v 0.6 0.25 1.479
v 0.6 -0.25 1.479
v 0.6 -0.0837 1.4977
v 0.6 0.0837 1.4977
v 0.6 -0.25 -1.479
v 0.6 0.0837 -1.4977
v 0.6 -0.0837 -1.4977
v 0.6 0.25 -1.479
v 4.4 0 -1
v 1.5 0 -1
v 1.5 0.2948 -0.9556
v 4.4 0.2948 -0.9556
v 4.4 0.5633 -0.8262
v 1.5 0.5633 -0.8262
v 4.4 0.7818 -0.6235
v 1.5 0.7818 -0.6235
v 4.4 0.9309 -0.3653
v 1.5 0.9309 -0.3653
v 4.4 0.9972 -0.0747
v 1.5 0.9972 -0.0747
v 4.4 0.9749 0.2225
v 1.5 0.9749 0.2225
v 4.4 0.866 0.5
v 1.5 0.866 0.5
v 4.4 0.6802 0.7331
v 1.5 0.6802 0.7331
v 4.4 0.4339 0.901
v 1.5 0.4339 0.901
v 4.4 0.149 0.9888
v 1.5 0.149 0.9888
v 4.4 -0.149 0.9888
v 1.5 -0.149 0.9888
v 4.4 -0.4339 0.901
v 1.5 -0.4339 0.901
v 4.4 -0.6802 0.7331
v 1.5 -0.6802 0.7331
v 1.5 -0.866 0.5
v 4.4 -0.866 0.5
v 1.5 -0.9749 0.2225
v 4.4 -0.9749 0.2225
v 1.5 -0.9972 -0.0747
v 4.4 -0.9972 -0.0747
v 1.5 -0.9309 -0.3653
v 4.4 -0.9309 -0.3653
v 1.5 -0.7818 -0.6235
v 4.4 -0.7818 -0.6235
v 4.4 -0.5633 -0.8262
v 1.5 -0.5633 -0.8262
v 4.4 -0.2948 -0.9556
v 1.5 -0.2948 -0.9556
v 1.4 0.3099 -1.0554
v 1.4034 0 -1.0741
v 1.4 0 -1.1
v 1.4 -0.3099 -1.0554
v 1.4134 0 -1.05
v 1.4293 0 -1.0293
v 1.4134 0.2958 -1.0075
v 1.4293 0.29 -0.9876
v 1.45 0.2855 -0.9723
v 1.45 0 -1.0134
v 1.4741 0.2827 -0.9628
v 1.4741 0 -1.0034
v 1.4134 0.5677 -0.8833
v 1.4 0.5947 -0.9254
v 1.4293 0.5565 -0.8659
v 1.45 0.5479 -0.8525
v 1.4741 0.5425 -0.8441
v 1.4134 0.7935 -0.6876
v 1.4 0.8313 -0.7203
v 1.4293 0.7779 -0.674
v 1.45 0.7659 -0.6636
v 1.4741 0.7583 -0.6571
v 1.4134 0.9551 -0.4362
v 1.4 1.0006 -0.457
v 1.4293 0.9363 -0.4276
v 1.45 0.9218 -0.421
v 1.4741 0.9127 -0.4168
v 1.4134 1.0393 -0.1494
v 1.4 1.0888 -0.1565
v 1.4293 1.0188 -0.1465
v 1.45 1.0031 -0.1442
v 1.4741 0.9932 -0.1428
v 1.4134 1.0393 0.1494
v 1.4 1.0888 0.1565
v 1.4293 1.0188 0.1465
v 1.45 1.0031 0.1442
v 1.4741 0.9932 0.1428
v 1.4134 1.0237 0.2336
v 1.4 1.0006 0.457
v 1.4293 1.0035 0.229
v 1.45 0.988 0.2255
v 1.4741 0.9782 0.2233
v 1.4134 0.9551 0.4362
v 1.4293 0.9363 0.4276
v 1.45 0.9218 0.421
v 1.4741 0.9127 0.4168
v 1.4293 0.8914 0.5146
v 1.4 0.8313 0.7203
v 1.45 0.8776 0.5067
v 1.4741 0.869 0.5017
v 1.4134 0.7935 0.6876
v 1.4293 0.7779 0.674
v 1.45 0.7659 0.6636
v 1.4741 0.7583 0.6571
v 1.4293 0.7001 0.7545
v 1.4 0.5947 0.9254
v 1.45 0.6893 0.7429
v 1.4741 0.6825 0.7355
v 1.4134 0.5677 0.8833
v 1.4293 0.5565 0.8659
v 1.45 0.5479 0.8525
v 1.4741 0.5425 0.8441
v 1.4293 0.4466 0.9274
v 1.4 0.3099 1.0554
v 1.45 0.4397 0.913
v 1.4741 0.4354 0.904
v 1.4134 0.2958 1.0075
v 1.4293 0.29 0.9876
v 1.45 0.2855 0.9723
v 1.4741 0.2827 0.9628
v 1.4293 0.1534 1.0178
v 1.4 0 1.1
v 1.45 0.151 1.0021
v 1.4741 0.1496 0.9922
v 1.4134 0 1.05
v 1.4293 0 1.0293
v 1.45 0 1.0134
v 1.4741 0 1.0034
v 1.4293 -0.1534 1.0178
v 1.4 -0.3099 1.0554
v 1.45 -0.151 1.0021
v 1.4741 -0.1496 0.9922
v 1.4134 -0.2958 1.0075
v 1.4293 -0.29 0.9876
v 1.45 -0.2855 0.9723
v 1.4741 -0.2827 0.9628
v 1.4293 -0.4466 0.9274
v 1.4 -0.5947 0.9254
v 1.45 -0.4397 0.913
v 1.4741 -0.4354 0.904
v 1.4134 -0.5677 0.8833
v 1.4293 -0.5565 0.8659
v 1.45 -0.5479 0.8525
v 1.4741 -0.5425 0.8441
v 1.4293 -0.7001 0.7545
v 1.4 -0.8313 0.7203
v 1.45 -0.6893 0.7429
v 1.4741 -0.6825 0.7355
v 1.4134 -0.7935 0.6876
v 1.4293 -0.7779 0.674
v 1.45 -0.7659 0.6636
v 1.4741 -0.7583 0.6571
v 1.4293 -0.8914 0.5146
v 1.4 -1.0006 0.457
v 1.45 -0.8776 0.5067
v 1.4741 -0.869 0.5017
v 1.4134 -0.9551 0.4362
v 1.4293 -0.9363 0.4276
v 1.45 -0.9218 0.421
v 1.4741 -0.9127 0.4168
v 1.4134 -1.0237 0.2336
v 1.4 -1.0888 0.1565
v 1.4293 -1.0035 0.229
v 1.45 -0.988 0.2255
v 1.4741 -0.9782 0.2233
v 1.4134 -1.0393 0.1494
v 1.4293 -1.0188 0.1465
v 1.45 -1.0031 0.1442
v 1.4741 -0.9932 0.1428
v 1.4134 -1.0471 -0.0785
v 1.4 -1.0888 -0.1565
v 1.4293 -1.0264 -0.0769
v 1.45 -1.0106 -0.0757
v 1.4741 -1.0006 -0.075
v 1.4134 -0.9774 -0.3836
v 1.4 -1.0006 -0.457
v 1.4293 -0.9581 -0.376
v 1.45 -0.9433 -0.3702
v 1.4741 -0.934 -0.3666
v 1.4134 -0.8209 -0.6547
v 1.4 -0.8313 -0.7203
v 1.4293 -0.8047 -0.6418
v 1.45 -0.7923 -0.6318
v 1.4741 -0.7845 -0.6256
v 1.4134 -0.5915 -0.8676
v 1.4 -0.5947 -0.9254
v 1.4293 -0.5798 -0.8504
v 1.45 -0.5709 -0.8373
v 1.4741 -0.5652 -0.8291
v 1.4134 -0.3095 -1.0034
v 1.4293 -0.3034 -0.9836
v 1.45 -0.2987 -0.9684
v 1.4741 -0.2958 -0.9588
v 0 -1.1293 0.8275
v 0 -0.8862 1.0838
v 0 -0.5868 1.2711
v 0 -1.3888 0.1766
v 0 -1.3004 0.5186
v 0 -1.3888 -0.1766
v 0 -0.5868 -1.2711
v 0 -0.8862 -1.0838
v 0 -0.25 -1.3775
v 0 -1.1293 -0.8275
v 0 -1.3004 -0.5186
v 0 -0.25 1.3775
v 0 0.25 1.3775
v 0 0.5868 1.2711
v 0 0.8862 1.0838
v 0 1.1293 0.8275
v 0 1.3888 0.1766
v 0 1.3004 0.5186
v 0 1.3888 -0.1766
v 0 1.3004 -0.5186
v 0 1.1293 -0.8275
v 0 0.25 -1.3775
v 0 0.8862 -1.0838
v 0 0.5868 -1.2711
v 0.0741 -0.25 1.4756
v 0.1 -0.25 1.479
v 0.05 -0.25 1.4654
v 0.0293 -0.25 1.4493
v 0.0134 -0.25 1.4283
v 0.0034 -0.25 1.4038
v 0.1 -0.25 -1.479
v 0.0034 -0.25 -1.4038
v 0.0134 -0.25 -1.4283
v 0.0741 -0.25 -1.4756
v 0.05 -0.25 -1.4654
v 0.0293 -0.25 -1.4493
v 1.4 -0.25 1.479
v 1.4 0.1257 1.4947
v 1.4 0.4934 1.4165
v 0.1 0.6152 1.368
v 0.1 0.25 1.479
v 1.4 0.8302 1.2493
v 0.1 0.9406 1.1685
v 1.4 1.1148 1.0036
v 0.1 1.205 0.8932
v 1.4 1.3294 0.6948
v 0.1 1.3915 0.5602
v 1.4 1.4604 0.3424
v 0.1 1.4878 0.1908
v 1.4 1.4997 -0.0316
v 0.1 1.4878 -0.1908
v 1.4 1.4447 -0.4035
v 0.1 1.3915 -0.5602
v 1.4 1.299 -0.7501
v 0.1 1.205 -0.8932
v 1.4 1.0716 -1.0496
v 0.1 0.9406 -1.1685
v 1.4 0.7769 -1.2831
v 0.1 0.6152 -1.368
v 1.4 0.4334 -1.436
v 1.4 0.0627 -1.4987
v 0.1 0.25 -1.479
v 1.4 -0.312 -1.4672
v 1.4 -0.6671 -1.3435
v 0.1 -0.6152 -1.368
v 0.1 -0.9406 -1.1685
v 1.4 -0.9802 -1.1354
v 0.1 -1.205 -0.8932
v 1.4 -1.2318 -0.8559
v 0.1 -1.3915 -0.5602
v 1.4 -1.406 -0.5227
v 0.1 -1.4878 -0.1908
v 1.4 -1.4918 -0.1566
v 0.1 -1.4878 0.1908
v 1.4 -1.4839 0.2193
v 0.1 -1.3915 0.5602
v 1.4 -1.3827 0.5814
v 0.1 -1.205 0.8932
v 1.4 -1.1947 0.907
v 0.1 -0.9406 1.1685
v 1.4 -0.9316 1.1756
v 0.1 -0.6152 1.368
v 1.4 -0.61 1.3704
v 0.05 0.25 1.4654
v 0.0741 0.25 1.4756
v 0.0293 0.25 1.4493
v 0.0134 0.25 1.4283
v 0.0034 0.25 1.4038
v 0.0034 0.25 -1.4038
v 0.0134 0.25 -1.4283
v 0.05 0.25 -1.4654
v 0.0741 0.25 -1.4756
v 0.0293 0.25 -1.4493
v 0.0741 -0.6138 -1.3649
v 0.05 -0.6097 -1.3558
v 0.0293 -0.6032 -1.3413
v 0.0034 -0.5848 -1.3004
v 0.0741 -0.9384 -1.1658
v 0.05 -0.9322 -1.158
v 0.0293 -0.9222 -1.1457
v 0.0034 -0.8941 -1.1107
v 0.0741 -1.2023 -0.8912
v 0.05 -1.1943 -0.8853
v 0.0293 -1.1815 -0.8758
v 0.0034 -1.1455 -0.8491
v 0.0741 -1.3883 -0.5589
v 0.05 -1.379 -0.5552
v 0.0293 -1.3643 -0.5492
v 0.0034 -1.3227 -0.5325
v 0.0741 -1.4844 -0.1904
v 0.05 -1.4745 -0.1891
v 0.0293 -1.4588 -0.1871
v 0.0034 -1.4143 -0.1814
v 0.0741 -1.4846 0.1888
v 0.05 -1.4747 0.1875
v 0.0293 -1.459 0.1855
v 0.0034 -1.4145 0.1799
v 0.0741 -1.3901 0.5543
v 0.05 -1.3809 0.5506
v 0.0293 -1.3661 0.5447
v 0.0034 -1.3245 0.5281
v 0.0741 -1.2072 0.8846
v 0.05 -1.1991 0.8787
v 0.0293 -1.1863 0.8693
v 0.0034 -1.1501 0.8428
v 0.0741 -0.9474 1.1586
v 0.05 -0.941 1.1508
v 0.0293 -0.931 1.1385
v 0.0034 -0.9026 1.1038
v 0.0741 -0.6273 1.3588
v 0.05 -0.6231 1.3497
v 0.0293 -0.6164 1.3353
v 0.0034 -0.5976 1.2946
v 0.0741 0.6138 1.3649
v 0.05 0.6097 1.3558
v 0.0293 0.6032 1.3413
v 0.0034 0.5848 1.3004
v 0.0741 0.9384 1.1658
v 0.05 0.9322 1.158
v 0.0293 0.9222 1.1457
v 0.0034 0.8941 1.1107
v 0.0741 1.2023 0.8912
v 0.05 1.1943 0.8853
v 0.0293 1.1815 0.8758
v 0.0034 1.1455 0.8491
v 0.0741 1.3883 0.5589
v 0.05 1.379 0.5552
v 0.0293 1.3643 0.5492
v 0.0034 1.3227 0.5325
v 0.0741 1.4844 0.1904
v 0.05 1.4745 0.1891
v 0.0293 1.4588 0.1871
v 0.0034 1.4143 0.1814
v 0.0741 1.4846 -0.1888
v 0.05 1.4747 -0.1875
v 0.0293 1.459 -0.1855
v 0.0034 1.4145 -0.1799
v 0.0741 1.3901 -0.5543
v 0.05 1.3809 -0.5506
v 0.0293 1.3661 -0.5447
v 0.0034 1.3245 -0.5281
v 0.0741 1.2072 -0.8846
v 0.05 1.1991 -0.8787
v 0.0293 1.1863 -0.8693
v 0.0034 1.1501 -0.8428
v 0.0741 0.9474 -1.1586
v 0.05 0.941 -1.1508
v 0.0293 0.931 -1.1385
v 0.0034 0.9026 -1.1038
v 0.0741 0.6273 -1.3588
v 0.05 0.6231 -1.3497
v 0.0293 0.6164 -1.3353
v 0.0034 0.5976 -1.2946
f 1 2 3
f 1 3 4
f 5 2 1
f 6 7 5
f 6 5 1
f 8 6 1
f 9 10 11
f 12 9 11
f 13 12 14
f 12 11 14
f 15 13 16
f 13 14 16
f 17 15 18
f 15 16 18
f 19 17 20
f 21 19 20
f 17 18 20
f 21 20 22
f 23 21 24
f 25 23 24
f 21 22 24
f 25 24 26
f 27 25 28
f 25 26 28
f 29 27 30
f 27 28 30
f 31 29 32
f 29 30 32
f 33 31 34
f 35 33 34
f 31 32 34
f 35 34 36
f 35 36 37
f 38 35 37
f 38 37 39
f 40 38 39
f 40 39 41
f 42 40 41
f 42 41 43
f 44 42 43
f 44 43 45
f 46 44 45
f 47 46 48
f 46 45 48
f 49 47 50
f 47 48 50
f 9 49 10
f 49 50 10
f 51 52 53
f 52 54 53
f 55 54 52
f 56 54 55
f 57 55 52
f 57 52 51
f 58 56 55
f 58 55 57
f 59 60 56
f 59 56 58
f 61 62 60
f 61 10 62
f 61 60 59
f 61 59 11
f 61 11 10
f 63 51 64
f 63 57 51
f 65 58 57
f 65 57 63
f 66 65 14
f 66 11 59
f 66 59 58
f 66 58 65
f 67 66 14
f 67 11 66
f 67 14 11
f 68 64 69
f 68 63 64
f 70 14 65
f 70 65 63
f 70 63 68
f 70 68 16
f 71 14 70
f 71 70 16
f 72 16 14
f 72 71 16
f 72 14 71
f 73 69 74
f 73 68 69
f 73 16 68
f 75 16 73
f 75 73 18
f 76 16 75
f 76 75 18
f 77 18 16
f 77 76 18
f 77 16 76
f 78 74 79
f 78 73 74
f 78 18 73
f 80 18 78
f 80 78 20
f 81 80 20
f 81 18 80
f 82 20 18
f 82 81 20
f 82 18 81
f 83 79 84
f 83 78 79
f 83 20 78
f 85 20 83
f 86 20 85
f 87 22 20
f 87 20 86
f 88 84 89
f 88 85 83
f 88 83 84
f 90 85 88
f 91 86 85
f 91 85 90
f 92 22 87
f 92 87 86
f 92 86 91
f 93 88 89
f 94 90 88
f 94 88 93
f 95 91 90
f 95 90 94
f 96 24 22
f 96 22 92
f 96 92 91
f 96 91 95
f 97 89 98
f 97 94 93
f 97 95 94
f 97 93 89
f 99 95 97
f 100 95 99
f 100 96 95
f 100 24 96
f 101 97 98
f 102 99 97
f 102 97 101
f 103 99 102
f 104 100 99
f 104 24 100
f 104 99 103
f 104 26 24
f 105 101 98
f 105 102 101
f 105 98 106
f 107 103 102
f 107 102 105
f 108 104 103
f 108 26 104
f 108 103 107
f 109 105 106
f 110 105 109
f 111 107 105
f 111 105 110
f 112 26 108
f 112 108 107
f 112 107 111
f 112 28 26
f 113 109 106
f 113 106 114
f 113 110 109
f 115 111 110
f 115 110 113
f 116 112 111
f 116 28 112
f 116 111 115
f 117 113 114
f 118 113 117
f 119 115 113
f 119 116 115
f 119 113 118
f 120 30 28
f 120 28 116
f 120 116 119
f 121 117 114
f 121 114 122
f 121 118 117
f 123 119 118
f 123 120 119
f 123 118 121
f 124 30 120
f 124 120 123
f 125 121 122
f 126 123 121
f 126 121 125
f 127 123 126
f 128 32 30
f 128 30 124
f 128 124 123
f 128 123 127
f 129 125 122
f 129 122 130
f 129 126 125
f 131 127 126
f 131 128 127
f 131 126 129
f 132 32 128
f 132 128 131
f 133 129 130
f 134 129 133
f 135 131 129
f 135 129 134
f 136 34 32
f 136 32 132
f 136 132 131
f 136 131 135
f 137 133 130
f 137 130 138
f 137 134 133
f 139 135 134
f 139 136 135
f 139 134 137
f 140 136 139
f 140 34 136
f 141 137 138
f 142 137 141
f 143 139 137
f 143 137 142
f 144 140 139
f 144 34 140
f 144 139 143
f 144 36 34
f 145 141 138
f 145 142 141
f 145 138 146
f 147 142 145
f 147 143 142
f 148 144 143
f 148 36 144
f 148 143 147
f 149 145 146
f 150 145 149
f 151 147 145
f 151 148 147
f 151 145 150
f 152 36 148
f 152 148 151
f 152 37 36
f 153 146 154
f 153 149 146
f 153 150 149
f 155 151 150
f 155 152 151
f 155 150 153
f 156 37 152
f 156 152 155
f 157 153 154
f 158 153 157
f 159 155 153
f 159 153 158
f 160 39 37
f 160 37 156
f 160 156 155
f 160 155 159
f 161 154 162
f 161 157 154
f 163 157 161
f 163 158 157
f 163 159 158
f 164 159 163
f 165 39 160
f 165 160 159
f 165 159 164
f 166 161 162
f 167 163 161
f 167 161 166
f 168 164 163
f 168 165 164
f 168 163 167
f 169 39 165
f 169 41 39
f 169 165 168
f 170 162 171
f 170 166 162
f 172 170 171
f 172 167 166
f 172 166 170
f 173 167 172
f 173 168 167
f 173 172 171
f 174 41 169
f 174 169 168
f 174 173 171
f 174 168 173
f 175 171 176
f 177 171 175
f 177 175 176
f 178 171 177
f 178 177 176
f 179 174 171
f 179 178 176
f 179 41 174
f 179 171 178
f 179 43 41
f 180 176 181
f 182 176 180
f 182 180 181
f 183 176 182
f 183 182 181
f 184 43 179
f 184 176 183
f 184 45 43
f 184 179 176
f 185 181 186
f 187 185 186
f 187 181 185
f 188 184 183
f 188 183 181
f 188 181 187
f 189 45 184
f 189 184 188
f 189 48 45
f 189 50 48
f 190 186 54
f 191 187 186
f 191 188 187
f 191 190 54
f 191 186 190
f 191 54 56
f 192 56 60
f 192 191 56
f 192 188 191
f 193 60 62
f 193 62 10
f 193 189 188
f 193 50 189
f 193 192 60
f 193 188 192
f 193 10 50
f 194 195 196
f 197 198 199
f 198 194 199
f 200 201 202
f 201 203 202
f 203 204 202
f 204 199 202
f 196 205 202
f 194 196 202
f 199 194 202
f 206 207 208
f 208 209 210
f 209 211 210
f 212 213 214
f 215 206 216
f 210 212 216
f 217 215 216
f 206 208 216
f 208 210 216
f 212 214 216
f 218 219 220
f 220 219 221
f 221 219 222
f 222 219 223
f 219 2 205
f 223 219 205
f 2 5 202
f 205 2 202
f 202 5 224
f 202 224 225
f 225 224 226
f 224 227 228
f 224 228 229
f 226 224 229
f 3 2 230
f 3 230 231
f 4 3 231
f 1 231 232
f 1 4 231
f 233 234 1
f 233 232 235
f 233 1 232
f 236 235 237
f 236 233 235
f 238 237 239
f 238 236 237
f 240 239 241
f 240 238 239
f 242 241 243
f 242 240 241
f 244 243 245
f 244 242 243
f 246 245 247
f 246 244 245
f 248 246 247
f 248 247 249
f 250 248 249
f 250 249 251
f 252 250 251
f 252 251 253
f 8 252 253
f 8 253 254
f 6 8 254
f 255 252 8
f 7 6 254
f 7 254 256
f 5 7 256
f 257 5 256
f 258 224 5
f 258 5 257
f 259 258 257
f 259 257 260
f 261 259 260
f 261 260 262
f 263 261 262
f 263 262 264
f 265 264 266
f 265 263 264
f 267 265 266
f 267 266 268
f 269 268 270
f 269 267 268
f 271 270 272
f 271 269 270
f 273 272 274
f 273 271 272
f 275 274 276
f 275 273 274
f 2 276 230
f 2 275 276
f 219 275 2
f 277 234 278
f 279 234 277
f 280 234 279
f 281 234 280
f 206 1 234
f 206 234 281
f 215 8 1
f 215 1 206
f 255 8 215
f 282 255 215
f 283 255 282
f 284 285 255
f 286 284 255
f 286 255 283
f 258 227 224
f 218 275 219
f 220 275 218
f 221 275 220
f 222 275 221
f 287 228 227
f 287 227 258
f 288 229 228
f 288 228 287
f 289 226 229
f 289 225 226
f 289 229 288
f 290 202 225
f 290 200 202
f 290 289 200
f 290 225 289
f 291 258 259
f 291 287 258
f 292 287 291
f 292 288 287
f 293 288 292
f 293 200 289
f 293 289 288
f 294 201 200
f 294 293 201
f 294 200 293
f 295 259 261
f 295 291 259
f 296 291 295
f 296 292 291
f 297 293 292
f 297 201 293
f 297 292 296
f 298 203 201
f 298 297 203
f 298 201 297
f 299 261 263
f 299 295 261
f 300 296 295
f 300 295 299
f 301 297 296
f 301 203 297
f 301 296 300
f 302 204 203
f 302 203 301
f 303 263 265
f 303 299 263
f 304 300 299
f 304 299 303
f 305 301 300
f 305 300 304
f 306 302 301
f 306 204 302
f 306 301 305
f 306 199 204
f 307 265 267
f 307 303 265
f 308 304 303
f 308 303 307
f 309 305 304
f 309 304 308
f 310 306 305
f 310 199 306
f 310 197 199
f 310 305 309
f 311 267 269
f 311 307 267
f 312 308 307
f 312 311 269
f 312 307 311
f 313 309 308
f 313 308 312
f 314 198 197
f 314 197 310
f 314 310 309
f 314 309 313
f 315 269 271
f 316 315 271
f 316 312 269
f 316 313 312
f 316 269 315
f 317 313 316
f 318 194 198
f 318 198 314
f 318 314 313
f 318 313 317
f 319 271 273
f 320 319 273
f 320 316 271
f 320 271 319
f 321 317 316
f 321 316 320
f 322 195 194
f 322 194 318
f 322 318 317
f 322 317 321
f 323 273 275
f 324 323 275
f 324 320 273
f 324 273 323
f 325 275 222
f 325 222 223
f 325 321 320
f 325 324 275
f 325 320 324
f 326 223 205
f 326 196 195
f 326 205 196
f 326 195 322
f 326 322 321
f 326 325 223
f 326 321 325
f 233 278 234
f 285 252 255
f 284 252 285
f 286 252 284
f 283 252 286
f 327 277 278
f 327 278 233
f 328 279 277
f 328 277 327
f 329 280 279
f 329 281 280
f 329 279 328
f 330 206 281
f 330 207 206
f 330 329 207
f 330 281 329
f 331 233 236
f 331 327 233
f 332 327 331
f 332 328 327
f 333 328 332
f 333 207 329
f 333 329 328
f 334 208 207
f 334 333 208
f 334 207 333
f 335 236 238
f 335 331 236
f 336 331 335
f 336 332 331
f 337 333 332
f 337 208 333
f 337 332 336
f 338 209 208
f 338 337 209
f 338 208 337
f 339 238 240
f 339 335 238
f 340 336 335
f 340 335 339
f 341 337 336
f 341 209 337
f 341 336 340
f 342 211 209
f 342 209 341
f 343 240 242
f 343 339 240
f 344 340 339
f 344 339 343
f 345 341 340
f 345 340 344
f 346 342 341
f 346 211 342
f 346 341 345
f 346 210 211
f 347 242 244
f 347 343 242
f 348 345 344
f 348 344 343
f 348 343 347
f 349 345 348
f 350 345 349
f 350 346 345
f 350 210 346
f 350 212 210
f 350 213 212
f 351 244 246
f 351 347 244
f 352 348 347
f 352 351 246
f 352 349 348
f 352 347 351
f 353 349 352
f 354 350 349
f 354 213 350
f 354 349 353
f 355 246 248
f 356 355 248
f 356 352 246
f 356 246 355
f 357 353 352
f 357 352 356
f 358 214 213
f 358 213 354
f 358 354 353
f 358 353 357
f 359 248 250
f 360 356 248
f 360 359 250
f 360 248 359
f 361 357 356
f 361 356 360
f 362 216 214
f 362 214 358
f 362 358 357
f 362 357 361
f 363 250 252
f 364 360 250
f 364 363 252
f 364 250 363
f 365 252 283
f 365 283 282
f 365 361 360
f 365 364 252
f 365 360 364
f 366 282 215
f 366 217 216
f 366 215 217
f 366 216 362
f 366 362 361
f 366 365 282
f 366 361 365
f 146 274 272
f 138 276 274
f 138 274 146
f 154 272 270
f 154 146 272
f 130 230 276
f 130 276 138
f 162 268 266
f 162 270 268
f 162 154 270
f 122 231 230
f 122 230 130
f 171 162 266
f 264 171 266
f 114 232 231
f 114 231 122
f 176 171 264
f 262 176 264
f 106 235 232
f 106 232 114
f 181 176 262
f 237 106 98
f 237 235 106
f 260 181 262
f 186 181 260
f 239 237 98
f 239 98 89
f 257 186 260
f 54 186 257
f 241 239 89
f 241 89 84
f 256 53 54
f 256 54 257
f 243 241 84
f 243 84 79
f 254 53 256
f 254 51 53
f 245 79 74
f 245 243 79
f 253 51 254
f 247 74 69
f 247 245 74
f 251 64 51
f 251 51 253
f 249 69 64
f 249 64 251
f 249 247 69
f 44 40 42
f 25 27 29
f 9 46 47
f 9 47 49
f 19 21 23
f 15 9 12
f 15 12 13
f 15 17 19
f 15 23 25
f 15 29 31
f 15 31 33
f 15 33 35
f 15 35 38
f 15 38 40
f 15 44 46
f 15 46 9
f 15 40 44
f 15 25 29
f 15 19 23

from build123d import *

# Parameters (mm, degrees)
SKETCH2_R           = 1.9
BASEHEAD_DEPTH      = 1.4
BASEHEAD_DRAFT      = -3
SKETCH3_R           = 1
BASEBODY_DEPTH      = 3
SLOT_DEPTH          = 8.598684097
SLOT_DEPTH_BACK     = 8.598684097
SKETCH4_W           = 0.5
SKETCH4_H           = 0.6
HEADFILLET_R        = 0.1
SKETCH_1_OUTSIDE_W  = 7.19
SKETCH_1_OUTSIDE_H  = 7.19
SKETCH_1_OUTSIDE_R  = 1.5
CUT_EXTRUDE_1_DEPTH = 6.155579502
FILLET_1_R          = 0.1


with BuildPart() as part:
    # Sketch2 → BaseHead (with draft: the straight prism first)
    with BuildSketch(Plane(origin=(1.4, 0, 0), x_dir=(0, 0, -1), z_dir=(1, 0, 0))):
        Circle(SKETCH2_R)
    extrude(amount=-BASEHEAD_DEPTH)
    # BaseHead: the draft: its side faces are tilted about the plane it starts from
    basehead_sides = [part.faces().sort_by_distance(p)[0] for p in [
        (0.7, 0, 1.9),
    ]]
    draft(basehead_sides, Plane(origin=(1.4, 0, 0), x_dir=(0, 0, -1), z_dir=(1, 0, 0)), BASEHEAD_DRAFT)

    # Sketch3 → BaseBody (add)
    with BuildSketch(Plane(origin=(1.4, -1.110095321, -1.354392991), x_dir=(0, 0, -1), z_dir=(1, 0, 0))):
        with Locations((-1.354392991, 1.110095321)):
            Circle(SKETCH3_R)
    extrude(amount=BASEBODY_DEPTH)

    # Sketch4 → Slot (cut, two sides: drawn at the far end of the back side and taken through both)
    with BuildSketch(Plane(origin=(-1.9, -1.9, 0), x_dir=(0, 1, 0), z_dir=(0, 0, 1)).offset(-SLOT_DEPTH_BACK)):
        with Locations((1.9, -2.2)):
            Rectangle(SKETCH4_W, SKETCH4_H)
    extrude(amount=SLOT_DEPTH + SLOT_DEPTH_BACK, mode=Mode.SUBTRACT)

    # HeadFillet
    headfillet_edges = [part.edges().sort_by_distance(p)[0] for p in [
        (1.4, 0, 1),
        (0, -1.826629109, 0),
        (0, 1.826629109, 0),
    ]]
    fillet(headfillet_edges, radius=HEADFILLET_R)

    # 草图1 outside → 切除-拉伸1 (cut, through all)
    with BuildSketch(Plane.ZY):
        Rectangle(SKETCH_1_OUTSIDE_W, SKETCH_1_OUTSIDE_H)
        with Locations(Location((0, 0, 0), (0, 0, 350.405931773))):
            Circle(SKETCH_1_OUTSIDE_R, mode=Mode.SUBTRACT)
    extrude(amount=-CUT_EXTRUDE_1_DEPTH, mode=Mode.SUBTRACT)

    # 圆角1
    fillet_1_edges = [part.edges().sort_by_distance(p)[0] for p in [
        (0, 1.5, 0),
        (0, -1.5, 0),
    ]]
    fillet(fillet_1_edges, radius=FILLET_1_R)


solid = part.part
